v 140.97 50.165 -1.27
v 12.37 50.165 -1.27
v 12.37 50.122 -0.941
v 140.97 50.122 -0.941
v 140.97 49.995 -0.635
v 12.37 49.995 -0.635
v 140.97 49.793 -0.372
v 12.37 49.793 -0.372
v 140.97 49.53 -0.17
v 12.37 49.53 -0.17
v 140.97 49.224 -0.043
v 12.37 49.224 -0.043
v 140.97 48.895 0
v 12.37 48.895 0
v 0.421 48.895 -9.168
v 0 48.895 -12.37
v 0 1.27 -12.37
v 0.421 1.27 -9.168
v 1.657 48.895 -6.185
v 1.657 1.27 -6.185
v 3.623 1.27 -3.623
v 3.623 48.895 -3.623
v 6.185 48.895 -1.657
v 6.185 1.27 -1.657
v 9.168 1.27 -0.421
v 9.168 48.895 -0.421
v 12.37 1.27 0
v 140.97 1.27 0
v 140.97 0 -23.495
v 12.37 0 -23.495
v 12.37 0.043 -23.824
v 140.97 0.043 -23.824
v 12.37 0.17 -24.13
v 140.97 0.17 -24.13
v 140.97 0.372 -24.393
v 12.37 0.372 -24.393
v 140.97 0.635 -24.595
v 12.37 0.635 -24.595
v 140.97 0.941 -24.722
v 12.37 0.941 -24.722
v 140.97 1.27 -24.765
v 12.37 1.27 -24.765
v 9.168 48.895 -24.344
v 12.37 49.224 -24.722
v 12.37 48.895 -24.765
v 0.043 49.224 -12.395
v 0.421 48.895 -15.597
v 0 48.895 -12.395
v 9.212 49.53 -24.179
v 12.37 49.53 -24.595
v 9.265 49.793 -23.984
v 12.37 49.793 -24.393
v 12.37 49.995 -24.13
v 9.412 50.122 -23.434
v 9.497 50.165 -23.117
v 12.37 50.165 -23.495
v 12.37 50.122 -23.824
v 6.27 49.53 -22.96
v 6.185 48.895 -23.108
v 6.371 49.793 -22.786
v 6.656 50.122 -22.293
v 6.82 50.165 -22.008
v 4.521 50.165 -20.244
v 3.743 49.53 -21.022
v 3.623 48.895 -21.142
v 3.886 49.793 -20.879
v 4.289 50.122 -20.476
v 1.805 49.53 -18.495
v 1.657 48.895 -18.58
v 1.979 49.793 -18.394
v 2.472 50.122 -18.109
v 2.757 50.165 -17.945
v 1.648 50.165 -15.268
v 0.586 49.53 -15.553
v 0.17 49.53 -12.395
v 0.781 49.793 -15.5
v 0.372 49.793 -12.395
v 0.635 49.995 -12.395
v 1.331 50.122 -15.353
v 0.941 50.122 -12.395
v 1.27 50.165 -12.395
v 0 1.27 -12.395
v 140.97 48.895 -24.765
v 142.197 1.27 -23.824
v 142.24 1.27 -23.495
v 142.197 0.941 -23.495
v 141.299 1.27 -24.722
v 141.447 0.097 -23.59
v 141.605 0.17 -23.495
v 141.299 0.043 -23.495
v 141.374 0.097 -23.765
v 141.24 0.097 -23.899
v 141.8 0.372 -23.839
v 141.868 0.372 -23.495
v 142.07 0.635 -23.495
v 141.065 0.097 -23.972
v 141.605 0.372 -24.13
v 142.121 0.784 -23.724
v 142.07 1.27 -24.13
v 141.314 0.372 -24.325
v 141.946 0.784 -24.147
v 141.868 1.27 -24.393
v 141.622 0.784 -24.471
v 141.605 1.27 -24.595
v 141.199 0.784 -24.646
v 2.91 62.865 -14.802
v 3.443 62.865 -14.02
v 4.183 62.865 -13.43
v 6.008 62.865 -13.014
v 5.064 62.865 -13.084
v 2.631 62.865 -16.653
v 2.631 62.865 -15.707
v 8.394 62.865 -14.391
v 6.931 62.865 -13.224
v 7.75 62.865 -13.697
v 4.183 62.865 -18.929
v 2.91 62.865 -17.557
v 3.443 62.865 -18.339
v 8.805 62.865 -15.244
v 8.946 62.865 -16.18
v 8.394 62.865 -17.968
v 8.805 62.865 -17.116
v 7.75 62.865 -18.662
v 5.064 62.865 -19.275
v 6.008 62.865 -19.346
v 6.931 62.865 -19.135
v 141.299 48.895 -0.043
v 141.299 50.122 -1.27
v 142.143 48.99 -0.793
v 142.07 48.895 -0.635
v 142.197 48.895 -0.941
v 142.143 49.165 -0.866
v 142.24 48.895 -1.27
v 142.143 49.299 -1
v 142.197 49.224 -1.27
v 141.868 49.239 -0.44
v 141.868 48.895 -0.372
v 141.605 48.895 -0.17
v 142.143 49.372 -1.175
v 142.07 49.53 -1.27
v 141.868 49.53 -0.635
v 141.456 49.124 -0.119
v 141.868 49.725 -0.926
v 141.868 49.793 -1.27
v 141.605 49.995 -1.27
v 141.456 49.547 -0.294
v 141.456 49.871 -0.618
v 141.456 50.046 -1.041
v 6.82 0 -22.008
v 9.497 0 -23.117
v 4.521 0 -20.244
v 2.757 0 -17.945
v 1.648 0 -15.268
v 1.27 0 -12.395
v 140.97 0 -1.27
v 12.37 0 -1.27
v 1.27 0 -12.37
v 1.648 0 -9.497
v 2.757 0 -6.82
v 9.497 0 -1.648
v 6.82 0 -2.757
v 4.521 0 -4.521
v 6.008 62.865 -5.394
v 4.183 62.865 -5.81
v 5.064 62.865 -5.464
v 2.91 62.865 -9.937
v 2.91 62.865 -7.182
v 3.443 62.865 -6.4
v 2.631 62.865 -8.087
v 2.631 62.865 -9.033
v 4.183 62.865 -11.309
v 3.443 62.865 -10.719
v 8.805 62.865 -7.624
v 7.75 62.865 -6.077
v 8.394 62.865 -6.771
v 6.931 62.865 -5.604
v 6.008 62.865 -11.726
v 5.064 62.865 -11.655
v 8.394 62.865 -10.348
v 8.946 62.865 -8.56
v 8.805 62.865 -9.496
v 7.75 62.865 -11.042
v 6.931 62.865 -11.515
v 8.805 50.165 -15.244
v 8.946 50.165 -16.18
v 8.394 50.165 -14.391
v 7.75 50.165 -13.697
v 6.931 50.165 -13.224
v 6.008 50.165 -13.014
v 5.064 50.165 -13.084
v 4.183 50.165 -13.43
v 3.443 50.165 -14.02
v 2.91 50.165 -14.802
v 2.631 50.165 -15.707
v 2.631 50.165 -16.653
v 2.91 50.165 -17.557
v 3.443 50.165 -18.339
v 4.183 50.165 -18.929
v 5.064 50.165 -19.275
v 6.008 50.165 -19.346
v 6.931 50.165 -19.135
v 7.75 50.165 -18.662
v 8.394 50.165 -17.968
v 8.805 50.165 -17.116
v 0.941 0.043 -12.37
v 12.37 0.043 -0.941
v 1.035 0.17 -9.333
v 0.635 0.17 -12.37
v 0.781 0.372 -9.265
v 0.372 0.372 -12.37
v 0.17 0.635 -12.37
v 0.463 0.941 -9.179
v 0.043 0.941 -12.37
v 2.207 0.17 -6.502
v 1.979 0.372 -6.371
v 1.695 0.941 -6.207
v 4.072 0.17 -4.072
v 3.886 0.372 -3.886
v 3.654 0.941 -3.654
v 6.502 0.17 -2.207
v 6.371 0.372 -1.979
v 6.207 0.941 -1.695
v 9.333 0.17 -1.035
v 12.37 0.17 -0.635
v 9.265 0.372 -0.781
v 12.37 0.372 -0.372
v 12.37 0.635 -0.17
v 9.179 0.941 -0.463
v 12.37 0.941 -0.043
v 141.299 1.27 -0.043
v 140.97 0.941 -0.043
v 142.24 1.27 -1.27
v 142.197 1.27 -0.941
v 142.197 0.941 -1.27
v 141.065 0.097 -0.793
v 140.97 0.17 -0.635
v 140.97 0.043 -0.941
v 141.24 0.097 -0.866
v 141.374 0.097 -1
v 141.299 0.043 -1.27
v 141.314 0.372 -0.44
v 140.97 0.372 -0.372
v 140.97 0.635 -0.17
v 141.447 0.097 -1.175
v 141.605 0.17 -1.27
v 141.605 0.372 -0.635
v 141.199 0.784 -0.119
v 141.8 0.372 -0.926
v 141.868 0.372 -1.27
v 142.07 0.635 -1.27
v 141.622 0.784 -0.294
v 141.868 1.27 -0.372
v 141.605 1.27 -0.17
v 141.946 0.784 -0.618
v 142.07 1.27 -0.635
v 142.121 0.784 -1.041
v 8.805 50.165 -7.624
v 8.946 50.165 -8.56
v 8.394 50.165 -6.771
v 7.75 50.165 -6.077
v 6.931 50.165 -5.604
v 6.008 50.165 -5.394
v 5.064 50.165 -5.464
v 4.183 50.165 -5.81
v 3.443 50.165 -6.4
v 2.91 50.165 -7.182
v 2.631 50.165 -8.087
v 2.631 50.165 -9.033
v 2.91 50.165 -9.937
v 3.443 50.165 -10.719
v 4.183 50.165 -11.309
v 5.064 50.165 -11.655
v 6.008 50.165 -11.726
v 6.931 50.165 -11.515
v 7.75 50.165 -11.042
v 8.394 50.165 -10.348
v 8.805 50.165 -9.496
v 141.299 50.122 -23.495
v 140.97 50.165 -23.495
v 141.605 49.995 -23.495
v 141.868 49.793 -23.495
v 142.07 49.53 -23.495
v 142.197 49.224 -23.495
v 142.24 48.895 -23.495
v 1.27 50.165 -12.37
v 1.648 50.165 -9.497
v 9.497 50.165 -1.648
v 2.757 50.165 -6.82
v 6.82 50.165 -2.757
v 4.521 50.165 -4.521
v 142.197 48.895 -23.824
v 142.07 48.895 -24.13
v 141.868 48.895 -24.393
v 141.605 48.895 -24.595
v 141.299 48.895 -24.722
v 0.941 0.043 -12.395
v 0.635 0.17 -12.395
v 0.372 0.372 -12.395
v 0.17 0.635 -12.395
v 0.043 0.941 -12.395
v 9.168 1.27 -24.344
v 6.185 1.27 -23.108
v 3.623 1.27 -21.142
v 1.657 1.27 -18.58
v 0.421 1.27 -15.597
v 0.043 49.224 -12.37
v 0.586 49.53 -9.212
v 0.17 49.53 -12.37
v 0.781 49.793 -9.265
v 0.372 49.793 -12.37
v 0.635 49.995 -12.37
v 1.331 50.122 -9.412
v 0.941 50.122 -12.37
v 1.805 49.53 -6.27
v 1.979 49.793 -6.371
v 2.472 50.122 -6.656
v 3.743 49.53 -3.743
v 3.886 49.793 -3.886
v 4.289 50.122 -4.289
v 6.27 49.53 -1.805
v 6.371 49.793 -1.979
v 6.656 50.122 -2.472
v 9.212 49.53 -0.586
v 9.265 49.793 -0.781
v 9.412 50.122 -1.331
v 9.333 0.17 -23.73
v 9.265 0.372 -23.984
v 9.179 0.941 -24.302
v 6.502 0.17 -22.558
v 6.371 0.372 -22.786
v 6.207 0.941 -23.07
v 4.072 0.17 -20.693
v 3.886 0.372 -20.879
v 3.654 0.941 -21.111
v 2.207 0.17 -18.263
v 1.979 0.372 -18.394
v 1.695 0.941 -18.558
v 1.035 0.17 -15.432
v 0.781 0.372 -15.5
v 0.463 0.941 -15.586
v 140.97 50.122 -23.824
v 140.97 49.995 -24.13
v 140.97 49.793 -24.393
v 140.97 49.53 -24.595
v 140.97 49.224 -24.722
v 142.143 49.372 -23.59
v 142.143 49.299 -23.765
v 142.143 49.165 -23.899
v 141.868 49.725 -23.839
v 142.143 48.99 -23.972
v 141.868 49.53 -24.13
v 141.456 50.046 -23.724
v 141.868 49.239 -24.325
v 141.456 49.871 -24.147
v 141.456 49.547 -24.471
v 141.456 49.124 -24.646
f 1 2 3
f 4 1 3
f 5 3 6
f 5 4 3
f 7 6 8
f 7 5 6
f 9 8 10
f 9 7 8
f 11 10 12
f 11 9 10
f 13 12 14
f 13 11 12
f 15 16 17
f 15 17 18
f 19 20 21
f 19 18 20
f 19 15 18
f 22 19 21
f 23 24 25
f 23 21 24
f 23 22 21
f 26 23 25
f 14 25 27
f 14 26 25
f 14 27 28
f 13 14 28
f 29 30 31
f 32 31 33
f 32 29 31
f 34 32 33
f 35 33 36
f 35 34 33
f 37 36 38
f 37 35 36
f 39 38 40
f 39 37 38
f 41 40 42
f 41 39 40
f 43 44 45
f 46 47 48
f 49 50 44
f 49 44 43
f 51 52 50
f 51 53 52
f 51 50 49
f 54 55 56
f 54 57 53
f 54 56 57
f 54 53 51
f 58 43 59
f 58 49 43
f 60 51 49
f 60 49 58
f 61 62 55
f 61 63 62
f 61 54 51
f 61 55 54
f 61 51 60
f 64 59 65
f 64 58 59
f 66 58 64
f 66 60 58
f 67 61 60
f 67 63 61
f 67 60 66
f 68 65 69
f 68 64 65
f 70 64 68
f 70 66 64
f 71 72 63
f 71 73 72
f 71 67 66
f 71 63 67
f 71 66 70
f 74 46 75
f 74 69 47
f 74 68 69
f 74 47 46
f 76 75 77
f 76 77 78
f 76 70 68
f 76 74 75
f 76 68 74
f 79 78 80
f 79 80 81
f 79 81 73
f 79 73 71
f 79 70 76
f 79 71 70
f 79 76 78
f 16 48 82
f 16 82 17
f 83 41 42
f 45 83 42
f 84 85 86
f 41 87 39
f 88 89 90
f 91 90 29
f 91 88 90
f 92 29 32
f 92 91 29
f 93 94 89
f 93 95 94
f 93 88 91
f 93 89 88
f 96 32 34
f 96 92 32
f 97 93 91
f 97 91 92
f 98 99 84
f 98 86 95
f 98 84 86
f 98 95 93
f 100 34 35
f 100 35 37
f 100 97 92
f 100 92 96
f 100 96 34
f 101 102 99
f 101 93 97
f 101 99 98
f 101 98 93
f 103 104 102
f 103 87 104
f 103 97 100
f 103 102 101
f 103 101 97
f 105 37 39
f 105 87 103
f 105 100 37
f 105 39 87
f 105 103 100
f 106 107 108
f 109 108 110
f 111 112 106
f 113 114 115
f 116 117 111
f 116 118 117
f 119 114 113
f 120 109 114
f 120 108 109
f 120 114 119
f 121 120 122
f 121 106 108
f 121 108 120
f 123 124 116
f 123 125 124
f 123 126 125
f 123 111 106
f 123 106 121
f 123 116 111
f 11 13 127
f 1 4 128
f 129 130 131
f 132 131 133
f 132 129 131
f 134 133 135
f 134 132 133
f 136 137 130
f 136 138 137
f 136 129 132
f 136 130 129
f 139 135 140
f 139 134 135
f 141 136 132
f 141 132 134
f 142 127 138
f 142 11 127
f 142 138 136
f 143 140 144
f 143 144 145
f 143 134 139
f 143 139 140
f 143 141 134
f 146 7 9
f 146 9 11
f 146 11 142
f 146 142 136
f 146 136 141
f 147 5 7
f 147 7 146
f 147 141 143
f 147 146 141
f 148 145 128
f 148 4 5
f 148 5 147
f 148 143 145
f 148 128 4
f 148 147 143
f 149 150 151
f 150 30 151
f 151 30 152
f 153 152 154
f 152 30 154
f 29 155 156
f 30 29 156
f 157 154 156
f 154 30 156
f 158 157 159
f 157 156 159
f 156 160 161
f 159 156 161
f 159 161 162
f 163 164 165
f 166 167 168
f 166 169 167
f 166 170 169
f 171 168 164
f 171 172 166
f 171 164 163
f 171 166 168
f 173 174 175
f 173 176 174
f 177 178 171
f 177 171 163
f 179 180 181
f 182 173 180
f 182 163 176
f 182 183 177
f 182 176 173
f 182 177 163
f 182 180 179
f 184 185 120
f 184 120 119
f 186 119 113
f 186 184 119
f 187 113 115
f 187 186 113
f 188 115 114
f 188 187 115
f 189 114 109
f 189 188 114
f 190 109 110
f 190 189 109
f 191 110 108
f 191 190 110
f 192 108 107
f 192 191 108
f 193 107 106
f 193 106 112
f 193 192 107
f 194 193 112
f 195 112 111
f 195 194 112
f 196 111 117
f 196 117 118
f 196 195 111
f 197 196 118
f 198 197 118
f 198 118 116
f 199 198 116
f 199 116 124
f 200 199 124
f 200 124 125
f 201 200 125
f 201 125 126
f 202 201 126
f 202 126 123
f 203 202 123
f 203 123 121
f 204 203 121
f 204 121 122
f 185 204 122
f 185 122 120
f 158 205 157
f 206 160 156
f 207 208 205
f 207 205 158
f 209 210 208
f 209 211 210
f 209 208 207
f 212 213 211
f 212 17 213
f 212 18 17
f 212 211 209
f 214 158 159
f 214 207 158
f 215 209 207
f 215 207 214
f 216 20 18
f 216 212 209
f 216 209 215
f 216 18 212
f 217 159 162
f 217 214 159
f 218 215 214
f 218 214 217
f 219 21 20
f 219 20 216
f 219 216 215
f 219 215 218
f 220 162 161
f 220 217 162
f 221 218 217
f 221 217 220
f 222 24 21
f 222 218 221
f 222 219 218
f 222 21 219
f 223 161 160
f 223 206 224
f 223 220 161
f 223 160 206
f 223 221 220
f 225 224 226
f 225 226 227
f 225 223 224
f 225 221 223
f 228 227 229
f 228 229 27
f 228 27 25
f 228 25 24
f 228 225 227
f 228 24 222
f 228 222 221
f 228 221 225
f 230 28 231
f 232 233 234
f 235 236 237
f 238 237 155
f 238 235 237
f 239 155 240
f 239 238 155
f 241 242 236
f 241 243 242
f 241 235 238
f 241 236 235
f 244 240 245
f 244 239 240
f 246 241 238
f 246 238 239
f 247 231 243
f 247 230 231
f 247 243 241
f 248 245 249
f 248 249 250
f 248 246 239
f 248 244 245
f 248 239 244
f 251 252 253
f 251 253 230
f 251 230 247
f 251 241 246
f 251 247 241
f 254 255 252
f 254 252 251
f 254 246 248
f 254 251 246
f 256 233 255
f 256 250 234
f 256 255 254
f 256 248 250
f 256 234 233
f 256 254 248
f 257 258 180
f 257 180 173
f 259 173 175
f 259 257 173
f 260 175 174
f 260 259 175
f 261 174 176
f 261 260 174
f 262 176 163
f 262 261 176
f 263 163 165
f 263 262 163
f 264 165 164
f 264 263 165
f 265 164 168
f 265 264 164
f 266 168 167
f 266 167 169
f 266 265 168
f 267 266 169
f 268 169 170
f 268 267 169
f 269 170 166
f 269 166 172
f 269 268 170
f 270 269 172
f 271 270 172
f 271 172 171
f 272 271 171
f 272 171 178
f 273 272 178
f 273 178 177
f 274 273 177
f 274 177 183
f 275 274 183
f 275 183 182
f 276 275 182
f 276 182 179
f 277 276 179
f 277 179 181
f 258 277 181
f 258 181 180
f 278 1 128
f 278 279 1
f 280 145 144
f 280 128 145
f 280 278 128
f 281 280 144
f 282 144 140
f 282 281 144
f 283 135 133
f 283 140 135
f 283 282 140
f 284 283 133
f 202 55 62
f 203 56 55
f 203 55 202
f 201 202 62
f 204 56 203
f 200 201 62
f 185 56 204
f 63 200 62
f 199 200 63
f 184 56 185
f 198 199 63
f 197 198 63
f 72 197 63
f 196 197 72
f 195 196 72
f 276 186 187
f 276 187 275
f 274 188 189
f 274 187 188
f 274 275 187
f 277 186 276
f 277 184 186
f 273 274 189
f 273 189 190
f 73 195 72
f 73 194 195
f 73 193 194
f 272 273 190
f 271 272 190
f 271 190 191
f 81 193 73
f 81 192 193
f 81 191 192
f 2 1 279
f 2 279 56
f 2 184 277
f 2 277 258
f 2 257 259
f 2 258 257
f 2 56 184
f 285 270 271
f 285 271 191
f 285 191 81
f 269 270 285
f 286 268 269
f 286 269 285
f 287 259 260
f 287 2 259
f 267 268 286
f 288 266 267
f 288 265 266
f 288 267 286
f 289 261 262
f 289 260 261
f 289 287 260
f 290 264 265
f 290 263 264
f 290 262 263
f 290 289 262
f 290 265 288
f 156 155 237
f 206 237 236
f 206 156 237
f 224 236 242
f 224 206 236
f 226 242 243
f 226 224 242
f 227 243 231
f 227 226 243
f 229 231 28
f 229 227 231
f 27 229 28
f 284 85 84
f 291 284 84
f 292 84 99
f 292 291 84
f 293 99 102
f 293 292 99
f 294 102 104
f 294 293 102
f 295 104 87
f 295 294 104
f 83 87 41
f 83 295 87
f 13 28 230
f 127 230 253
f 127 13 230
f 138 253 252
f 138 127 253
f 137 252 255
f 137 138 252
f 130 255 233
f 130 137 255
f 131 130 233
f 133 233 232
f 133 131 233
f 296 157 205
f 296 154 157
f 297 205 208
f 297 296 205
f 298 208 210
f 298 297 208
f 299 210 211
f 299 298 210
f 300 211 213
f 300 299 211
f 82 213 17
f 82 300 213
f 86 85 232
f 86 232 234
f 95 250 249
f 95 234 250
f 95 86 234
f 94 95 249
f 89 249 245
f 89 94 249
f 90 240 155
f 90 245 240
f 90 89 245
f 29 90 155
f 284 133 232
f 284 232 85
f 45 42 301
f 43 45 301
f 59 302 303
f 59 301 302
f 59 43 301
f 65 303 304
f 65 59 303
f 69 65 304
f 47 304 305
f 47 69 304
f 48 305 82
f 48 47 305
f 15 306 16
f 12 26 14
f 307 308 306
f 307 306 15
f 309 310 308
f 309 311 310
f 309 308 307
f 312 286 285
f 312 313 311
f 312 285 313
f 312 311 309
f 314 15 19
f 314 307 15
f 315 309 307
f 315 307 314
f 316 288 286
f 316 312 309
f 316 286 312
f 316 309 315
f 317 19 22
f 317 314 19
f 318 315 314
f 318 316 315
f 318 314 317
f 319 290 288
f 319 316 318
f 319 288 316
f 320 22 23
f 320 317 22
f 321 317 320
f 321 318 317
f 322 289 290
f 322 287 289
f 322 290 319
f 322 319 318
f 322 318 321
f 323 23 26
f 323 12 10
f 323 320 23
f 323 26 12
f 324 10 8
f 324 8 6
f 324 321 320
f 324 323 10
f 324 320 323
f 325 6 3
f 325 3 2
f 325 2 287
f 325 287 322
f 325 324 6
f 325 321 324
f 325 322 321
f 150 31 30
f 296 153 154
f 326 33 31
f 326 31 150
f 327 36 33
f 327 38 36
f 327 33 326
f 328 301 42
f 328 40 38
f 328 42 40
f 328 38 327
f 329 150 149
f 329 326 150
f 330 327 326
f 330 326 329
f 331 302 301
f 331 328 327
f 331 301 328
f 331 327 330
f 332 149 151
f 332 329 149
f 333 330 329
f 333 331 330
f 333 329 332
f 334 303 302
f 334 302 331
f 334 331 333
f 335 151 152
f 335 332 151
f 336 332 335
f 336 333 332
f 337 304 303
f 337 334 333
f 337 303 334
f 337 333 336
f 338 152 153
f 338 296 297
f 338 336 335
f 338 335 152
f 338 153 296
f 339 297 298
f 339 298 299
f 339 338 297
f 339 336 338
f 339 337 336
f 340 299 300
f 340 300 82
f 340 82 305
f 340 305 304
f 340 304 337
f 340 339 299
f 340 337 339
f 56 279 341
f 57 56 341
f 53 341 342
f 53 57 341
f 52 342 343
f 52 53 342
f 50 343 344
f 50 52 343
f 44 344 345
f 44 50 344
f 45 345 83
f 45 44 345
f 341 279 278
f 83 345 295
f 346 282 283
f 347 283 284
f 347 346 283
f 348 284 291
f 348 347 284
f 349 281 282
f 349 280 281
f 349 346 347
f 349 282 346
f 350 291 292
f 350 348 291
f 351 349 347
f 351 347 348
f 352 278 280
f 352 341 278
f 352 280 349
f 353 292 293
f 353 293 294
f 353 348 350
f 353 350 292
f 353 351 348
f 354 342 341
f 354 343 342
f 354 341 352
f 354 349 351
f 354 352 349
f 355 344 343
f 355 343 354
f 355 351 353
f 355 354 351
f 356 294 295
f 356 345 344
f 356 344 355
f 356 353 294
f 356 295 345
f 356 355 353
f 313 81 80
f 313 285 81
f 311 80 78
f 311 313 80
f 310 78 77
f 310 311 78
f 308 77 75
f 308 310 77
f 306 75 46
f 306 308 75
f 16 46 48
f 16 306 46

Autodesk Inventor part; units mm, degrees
ref_plane "YZ Plane" through (0, 0, 0) normal (1, 0, 0) x (0, 1, 0)
ref_plane "XZ Plane" through (0, 0, 0) normal (0, 1, 0) x (-1, 0, 0)
ref_plane "XY Plane" through (0, 0, 0) normal (0, 0, 1) x (1, 0, 0)
sketch "Sketch1" plane through (0, 0, 0) normal (0, 1, 0) x (-1, 0, 0)
  line L0 (0, 0) -> (-142.24, 0)
  line L1 (-142.24, 0) -> (-142.24, -24.765)
  line L2 (-142.24, -24.765) -> (0, -24.765)
  line L3 (0, -24.765) -> (0, 0)
  dimension "d0" = 142.24
  dimension "d1" = 24.765
extrude "Extrusion1" add sketch "Sketch1" along normal blind 50.165
fillet "Fillet1" radius 12.3698 2 edges at (0, 25.0825, 0) (0, 25.0825, -24.765)
fillet "Fillet2" radius 1.27 14 edges at (3.623, 50.165, -3.623) (0, 50.165, -12.3825) (3.623, 50.165, -21.142) (77.3049, 50.165, -24.765) (77.3049, 50.165, 0) (142.24, 50.165, -12.3825) (142.24, 25.0825, 0) (142.24, 25.0825, -24.765) (142.24, 0, -12.3825) (3.623, 0, -21.142) (0, 0, -12.3825) (3.623, 0, -3.623) (77.3049, 0, 0) (77.3049, 0, -24.765)
sketch "Sketch2" plane through (0, 50.165, 0) normal (0, 1, 0) x (1, 0, 0)
  line L0 (12.3698, 23.495) -> (140.97, 23.495) projected
  arc A0 (12.3698, 23.495) -> (1.27, 12.3952) centre (12.3698, 12.3952) ccw projected
  line L1 (1.27, 12.3698) -> (1.27, 12.3952) projected
  arc A1 (1.27, 12.3698) -> (12.3698, 1.27) centre (12.3698, 12.3698) ccw projected
  line L2 (140.97, 1.27) -> (12.3698, 1.27) projected
  line L3 (140.97, 23.495) -> (140.97, 1.27) projected
  line L4 (12.3698, 12.3698) -> (5.7707, 16.1798)
  line L5 (12.3698, 12.3698) -> (19.9898, 12.3698) construction
  line L6 (12.3698, 12.3698) -> (5.7707, 8.5598)
  line L7 (12.3698, 12.3698) -> (19.9898, 12.3698) construction
  circle A2 centre (5.7707, 8.5598) radius 3.175
  circle A3 centre (5.7707, 16.1798) radius 3.175
  point P0 (0, 0)
  dimension "d6" = 7.62
  dimension "d7" = 150
  dimension "d8" = 7.62
  dimension "d9" = 150
  dimension "d10" = 6.35
  dimension "d11" = 6.35
extrude "Extrusion2" add sketch "Sketch2" along normal blind 12.7 contours A3 | A2
properties part number "Battery"
